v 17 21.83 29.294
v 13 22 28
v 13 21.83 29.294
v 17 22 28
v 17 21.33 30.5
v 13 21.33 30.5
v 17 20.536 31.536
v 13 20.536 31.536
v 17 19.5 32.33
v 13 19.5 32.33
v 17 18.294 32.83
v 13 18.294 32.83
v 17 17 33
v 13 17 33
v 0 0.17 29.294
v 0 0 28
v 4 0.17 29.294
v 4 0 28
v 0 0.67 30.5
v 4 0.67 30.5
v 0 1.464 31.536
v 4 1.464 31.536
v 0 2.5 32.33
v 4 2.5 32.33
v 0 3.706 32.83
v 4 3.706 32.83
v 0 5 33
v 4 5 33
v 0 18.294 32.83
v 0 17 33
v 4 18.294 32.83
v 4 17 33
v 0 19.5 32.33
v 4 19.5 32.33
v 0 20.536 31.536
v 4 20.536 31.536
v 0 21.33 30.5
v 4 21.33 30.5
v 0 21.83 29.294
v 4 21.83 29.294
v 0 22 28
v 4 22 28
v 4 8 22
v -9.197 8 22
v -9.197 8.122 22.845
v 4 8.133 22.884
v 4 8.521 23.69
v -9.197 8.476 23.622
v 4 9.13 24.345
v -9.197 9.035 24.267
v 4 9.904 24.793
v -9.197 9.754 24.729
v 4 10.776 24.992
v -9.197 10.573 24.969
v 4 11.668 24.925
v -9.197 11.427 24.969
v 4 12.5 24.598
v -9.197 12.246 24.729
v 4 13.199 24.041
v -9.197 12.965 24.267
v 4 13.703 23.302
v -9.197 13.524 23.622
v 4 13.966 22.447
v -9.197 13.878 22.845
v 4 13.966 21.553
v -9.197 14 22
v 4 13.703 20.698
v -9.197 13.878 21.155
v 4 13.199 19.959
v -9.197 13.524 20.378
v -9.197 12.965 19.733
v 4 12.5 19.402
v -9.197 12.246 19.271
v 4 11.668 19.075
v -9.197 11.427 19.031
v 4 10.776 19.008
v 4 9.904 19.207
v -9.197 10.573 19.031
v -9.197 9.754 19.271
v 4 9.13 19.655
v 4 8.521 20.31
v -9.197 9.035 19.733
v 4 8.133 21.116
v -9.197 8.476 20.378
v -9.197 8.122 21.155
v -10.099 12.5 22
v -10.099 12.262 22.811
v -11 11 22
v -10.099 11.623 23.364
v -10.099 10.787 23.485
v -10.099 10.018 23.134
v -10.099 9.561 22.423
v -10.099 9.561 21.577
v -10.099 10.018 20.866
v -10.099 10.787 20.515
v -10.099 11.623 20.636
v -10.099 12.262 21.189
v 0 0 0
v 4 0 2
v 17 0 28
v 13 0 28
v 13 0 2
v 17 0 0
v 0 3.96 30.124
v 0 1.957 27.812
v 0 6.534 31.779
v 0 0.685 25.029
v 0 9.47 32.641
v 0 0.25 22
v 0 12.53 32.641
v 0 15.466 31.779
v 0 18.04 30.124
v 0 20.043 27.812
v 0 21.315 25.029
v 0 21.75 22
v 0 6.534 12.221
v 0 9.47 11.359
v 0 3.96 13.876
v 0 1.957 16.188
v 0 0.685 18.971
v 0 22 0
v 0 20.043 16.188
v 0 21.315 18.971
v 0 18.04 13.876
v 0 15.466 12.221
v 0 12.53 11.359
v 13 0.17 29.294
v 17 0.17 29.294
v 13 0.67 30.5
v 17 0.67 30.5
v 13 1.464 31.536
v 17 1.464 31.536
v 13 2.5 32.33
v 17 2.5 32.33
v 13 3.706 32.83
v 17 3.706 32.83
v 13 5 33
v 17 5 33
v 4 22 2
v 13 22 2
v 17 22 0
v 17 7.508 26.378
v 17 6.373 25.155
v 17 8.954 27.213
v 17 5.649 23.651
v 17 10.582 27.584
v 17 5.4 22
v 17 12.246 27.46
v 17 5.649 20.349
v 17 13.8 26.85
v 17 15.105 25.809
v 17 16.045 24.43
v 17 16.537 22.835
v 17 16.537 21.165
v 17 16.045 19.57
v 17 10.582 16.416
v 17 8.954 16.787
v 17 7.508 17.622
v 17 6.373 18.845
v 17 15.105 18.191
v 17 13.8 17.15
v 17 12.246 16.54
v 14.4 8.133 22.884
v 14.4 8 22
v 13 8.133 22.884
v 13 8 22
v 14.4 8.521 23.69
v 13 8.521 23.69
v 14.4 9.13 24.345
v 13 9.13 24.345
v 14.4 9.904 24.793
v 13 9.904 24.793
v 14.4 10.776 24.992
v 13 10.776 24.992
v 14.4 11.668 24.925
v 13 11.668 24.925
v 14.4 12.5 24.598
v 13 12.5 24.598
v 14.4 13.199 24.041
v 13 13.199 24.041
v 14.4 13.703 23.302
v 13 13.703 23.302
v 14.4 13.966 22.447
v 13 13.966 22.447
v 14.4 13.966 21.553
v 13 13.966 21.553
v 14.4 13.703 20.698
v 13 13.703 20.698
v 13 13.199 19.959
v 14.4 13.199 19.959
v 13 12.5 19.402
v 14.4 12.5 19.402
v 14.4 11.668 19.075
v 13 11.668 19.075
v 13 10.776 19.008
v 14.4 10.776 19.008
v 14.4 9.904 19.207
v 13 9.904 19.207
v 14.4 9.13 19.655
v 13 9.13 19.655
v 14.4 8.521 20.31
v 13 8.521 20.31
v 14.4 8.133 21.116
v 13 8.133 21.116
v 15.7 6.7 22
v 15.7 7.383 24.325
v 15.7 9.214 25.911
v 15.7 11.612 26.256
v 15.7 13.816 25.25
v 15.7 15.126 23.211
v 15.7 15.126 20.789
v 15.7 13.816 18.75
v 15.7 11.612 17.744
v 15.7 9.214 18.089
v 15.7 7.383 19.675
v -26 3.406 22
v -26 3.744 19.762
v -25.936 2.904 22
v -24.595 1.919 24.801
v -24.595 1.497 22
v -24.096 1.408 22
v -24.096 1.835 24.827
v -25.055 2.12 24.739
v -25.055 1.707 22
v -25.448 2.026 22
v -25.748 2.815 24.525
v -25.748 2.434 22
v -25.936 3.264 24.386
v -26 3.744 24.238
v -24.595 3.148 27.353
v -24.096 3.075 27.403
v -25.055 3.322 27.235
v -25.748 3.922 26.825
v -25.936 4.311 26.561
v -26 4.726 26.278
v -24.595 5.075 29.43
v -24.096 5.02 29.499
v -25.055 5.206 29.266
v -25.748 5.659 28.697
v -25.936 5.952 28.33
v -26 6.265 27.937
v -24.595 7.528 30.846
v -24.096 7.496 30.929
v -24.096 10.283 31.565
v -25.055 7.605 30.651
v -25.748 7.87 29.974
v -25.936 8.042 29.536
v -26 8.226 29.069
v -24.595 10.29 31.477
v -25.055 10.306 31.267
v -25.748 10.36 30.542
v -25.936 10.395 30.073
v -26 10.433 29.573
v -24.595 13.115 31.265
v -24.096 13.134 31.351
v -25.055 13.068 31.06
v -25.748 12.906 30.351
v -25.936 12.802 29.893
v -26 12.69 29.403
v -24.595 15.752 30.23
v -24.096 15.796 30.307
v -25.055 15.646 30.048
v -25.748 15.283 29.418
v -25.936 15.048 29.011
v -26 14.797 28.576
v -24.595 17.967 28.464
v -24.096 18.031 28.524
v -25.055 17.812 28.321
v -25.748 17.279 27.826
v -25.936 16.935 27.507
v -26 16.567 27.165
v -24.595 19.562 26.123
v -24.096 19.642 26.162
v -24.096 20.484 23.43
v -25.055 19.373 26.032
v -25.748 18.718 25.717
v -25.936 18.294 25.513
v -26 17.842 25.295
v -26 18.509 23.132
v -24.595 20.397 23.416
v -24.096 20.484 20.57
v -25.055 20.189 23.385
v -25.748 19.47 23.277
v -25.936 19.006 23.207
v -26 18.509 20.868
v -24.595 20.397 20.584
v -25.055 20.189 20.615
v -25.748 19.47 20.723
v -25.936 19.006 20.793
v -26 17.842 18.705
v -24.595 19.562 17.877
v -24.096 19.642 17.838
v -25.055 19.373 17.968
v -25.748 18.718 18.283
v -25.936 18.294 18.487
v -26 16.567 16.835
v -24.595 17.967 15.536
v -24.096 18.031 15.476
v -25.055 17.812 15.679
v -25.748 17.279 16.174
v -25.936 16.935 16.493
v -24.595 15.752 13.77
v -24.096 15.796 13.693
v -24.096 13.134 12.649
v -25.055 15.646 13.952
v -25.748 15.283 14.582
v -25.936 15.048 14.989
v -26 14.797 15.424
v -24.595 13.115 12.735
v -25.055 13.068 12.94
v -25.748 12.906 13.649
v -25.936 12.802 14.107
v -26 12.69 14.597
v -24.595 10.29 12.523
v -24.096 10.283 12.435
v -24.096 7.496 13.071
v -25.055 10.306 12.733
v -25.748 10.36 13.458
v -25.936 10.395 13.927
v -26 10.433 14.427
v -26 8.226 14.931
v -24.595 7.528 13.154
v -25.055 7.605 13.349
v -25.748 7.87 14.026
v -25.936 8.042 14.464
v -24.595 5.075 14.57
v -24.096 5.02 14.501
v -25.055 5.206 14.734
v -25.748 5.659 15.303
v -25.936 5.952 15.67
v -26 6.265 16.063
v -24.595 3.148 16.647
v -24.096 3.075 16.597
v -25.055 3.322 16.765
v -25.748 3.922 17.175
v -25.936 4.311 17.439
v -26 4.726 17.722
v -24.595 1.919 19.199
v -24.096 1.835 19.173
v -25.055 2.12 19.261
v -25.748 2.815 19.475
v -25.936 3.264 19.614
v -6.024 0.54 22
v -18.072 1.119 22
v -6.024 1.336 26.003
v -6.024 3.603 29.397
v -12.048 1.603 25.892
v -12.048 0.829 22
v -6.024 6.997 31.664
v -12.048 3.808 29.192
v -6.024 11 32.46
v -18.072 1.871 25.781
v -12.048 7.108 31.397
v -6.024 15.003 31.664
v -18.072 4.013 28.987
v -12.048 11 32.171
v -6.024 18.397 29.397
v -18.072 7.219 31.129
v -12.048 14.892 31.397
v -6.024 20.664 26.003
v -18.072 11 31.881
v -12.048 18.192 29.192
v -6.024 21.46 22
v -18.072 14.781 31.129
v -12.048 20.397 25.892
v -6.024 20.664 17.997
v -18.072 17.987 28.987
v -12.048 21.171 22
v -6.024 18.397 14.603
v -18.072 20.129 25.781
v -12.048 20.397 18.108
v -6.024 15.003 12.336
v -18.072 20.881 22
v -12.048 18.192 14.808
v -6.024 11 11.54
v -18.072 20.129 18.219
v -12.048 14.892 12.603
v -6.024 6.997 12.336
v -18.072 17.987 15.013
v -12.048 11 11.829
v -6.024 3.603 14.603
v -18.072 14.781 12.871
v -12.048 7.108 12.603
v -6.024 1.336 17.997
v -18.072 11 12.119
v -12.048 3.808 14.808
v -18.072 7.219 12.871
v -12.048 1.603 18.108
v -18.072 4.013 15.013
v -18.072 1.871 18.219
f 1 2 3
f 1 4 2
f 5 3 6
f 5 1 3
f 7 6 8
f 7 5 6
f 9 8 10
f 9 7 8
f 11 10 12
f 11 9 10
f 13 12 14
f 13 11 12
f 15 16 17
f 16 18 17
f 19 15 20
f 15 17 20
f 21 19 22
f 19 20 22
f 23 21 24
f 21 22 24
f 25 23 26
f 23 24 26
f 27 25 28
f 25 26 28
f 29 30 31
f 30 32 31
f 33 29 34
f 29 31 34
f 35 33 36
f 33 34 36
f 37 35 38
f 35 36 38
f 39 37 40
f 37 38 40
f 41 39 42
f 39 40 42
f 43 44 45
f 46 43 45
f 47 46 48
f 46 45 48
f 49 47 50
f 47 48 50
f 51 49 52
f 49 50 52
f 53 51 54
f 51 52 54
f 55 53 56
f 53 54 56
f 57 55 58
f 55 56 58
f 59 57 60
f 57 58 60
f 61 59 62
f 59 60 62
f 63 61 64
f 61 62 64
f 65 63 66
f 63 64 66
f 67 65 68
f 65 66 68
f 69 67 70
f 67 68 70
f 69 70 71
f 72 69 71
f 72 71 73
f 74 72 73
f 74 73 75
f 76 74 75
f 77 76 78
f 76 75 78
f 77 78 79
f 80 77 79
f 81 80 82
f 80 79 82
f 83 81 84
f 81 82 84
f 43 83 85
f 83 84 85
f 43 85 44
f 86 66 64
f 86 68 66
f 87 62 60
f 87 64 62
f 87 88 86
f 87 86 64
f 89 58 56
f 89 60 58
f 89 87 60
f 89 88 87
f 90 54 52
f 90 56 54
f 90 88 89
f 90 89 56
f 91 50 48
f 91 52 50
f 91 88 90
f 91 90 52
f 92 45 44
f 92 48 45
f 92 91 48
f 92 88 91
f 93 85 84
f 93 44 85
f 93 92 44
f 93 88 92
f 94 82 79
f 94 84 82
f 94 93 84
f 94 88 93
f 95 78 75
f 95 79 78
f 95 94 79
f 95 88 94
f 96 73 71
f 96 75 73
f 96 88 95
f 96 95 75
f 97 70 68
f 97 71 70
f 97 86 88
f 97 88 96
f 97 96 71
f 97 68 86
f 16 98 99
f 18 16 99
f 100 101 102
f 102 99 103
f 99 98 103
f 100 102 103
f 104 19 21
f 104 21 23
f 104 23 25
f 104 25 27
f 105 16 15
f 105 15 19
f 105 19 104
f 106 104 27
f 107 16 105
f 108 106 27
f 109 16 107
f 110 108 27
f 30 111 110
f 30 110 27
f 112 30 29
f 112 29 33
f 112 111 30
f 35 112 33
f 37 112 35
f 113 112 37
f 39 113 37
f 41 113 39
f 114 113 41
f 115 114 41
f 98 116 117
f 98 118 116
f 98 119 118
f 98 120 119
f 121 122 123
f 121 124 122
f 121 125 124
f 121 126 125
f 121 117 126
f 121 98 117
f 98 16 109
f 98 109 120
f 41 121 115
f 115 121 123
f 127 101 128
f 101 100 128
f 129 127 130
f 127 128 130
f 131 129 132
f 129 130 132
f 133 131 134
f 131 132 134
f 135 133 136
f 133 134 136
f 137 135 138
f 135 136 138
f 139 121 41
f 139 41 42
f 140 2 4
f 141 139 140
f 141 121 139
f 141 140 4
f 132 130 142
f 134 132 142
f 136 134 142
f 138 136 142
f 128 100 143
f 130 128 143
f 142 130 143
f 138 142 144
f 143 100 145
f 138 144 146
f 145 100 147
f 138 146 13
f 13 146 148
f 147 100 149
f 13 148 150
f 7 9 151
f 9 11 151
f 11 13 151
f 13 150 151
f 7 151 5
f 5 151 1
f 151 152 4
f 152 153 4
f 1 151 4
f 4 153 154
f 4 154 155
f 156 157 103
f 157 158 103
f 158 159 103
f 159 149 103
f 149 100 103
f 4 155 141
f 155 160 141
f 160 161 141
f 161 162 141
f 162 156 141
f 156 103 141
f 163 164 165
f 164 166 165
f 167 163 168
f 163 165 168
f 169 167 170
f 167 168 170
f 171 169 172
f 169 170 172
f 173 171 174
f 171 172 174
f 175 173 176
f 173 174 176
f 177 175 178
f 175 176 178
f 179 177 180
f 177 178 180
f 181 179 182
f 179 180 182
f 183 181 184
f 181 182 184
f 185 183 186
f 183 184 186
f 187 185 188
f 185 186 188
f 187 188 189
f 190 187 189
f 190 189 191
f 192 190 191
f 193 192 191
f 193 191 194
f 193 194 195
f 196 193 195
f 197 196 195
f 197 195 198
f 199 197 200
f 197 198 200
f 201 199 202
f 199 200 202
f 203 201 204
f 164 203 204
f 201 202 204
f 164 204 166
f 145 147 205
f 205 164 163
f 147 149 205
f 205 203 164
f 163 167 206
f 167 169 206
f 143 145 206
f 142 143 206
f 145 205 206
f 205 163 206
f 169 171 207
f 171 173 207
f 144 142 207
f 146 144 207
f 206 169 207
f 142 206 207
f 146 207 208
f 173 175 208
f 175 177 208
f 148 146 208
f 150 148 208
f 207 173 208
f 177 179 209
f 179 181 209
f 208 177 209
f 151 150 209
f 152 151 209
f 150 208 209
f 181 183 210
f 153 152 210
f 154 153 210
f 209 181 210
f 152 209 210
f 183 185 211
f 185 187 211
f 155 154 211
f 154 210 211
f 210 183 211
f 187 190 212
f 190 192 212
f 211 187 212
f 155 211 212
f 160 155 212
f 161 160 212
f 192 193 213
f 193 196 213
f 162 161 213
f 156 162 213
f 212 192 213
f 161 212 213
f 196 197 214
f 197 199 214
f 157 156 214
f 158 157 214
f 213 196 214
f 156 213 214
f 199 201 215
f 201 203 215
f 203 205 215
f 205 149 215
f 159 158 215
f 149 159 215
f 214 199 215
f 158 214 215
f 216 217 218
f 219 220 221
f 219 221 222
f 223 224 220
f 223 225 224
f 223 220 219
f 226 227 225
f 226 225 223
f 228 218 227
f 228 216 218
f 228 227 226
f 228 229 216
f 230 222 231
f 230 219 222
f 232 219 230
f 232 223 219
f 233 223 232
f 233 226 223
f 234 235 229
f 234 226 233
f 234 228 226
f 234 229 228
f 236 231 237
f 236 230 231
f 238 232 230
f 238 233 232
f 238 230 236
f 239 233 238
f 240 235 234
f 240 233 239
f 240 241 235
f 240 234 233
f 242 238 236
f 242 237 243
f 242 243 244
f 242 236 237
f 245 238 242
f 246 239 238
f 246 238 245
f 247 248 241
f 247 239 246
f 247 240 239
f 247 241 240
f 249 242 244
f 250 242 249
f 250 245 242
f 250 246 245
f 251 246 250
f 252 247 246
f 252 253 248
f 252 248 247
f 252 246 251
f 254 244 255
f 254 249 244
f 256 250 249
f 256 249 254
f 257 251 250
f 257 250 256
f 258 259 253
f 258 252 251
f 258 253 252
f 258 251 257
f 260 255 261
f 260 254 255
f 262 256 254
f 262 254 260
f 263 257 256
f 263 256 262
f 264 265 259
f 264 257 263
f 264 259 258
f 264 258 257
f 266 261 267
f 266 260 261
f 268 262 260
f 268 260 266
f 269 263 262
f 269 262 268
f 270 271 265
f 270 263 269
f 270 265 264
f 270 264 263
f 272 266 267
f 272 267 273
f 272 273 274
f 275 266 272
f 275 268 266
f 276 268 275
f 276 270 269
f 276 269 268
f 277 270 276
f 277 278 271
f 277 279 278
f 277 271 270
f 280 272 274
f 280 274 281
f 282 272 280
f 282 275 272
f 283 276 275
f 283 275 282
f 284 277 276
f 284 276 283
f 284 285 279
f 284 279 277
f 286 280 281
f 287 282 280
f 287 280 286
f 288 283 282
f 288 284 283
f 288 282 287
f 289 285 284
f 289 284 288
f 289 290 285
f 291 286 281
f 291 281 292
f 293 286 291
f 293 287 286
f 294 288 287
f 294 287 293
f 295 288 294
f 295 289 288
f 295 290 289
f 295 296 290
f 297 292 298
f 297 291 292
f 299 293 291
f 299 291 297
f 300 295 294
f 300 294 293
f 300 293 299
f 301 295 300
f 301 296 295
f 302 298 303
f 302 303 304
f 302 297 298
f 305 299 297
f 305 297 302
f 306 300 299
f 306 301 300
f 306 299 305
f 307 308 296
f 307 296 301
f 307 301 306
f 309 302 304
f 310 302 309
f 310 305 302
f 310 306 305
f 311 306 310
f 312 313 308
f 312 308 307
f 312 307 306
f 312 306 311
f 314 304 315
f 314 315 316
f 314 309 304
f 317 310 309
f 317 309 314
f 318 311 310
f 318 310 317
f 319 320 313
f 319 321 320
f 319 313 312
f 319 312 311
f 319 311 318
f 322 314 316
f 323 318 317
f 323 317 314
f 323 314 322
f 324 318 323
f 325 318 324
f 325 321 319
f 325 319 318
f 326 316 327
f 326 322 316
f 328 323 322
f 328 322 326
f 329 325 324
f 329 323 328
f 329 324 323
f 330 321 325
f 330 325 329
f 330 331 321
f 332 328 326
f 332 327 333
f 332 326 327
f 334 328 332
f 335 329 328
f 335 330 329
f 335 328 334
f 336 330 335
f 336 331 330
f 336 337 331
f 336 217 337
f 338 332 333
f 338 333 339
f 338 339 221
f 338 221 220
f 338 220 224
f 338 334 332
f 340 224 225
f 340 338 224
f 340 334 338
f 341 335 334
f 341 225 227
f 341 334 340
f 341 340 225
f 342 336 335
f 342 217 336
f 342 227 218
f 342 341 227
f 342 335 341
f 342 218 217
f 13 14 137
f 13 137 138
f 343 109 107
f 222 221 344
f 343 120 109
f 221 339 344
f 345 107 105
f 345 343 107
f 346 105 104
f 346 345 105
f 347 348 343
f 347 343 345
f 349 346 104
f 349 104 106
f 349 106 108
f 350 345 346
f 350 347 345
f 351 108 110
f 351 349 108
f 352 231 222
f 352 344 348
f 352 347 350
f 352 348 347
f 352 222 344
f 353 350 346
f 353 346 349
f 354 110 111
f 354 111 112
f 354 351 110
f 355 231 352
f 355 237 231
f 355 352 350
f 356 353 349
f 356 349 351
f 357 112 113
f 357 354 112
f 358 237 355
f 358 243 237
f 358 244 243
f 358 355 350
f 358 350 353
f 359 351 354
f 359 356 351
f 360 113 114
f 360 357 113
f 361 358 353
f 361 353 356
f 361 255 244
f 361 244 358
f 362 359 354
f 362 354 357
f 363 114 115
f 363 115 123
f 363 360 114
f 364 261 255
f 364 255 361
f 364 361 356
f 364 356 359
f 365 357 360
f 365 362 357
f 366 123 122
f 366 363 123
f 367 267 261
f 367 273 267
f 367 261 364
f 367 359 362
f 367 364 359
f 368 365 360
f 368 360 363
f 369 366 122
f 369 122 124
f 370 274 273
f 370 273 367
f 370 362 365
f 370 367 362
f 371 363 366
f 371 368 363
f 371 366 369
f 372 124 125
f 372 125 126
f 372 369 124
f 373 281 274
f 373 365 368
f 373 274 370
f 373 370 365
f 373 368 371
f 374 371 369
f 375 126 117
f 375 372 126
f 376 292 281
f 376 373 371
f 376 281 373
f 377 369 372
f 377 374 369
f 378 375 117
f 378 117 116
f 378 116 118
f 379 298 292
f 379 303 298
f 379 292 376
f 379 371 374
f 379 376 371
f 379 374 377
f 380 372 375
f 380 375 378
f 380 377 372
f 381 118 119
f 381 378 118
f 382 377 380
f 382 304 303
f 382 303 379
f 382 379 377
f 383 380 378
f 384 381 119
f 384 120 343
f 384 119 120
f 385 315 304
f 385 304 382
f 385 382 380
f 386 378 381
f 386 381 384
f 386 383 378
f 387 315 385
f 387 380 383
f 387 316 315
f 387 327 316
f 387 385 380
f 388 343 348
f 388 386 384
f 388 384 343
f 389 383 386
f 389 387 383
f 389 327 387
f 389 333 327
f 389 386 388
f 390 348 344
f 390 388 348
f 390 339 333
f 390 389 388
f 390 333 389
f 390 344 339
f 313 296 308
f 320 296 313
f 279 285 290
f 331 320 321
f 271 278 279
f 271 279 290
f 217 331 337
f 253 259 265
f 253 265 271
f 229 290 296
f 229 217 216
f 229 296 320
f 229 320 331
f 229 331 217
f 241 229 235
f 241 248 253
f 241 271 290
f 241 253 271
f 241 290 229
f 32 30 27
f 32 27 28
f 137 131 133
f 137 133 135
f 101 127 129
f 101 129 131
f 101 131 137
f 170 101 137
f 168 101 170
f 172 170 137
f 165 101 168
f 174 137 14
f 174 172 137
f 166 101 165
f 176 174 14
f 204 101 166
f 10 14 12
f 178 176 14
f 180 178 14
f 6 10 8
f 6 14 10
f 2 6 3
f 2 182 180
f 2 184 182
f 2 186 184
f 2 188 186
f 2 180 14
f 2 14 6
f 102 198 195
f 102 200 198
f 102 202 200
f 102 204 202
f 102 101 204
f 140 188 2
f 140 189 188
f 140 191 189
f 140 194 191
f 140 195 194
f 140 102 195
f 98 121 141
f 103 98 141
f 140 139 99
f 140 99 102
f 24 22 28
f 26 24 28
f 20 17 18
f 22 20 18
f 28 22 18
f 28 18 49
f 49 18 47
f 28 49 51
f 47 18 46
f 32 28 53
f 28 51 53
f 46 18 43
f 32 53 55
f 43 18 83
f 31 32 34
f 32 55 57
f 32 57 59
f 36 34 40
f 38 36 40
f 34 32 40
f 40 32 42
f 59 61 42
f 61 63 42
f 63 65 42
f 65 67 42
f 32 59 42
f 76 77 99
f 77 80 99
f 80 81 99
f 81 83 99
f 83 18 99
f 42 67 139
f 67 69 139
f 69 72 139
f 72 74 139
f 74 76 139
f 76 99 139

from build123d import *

# Parameters (mm, degrees)
SKETCH_W         = 17
SKETCH_H         = 22
PAD_DEPTH        = 2
SKETCH001_W      = 4
SKETCH001_H      = 22
PAD001_DEPTH     = 31
SKETCH002_R      = 10.75
SKETCH003_R      = 9.5
FILLET_R         = 2
HOLE_D           = 6
HOLE_DEPTH       = 26.197418
HOLE_CSINK_D     = 11.2
HOLE_CSINK_ANGLE = 90
HOLE_TIPS_R      = 3
FILLET001_R      = 5


with BuildPart() as part:
    # Sketch → Pad (new body)
    with BuildSketch(Plane.XY):
        with Locations((8.5, 11)):
            Rectangle(SKETCH_W, SKETCH_H)
    extrude(amount=PAD_DEPTH)

    # Sketch001 (on Face6 of Pad) → Pad001 (join)
    with BuildSketch(Plane.XY.offset(2)):
        with Locations((15, 11)):
            Rectangle(SKETCH001_W, SKETCH001_H)
        with Locations((2, 11)):
            Rectangle(SKETCH001_W, SKETCH001_H)
    extrude(amount=PAD001_DEPTH)

    # Sketch002 (on Face9 of Pad001) → AdditiveLoft section 0
    with BuildSketch(Plane(origin=(0, 0, 0), x_dir=(0, -1, 0), z_dir=(-1, 0, 0))):
        with Locations((-11, 22)):
            Circle(SKETCH002_R)
    # Sketch003 (on Face9 of Pad001) → AdditiveLoft section 1
    with BuildSketch(Plane(origin=(-26, 0, 0), x_dir=(0, -1, 0), z_dir=(-1, 0, 0))):
        with Locations((-11, 22)):
            Circle(SKETCH003_R)
    loft()

    # Fillet
    fillet_edges = [part.edges().sort_by_distance(p)[0] for p in [
        (-26, 20.5, 22),
    ]]
    fillet(fillet_edges, radius=FILLET_R)

    # Hole
    with Locations(Plane.YZ.offset(17)):
        with Locations((11, 22)):
            CounterSinkHole(HOLE_D / 2, HOLE_CSINK_D / 2, depth=HOLE_DEPTH, counter_sink_angle=HOLE_CSINK_ANGLE)

    # Hole tips → Hole tip 1 section 0
    with BuildSketch(Plane.YZ.offset(-9.197418), mode=Mode.PRIVATE) as hole_tip_1_s0:
        with Locations((11, 22)):
            Circle(HOLE_TIPS_R)
    loft([hole_tip_1_s0.sketch, Vertex(-11, 11, 22)], mode=Mode.SUBTRACT)

    # Fillet001
    fillet001_edges = [part.edges().sort_by_distance(p)[0] for p in [
        (15, 0, 33),
        (2, 0, 33),
        (2, 22, 33),
        (15, 22, 33),
    ]]
    fillet(fillet001_edges, radius=FILLET001_R)


solid = part.part
